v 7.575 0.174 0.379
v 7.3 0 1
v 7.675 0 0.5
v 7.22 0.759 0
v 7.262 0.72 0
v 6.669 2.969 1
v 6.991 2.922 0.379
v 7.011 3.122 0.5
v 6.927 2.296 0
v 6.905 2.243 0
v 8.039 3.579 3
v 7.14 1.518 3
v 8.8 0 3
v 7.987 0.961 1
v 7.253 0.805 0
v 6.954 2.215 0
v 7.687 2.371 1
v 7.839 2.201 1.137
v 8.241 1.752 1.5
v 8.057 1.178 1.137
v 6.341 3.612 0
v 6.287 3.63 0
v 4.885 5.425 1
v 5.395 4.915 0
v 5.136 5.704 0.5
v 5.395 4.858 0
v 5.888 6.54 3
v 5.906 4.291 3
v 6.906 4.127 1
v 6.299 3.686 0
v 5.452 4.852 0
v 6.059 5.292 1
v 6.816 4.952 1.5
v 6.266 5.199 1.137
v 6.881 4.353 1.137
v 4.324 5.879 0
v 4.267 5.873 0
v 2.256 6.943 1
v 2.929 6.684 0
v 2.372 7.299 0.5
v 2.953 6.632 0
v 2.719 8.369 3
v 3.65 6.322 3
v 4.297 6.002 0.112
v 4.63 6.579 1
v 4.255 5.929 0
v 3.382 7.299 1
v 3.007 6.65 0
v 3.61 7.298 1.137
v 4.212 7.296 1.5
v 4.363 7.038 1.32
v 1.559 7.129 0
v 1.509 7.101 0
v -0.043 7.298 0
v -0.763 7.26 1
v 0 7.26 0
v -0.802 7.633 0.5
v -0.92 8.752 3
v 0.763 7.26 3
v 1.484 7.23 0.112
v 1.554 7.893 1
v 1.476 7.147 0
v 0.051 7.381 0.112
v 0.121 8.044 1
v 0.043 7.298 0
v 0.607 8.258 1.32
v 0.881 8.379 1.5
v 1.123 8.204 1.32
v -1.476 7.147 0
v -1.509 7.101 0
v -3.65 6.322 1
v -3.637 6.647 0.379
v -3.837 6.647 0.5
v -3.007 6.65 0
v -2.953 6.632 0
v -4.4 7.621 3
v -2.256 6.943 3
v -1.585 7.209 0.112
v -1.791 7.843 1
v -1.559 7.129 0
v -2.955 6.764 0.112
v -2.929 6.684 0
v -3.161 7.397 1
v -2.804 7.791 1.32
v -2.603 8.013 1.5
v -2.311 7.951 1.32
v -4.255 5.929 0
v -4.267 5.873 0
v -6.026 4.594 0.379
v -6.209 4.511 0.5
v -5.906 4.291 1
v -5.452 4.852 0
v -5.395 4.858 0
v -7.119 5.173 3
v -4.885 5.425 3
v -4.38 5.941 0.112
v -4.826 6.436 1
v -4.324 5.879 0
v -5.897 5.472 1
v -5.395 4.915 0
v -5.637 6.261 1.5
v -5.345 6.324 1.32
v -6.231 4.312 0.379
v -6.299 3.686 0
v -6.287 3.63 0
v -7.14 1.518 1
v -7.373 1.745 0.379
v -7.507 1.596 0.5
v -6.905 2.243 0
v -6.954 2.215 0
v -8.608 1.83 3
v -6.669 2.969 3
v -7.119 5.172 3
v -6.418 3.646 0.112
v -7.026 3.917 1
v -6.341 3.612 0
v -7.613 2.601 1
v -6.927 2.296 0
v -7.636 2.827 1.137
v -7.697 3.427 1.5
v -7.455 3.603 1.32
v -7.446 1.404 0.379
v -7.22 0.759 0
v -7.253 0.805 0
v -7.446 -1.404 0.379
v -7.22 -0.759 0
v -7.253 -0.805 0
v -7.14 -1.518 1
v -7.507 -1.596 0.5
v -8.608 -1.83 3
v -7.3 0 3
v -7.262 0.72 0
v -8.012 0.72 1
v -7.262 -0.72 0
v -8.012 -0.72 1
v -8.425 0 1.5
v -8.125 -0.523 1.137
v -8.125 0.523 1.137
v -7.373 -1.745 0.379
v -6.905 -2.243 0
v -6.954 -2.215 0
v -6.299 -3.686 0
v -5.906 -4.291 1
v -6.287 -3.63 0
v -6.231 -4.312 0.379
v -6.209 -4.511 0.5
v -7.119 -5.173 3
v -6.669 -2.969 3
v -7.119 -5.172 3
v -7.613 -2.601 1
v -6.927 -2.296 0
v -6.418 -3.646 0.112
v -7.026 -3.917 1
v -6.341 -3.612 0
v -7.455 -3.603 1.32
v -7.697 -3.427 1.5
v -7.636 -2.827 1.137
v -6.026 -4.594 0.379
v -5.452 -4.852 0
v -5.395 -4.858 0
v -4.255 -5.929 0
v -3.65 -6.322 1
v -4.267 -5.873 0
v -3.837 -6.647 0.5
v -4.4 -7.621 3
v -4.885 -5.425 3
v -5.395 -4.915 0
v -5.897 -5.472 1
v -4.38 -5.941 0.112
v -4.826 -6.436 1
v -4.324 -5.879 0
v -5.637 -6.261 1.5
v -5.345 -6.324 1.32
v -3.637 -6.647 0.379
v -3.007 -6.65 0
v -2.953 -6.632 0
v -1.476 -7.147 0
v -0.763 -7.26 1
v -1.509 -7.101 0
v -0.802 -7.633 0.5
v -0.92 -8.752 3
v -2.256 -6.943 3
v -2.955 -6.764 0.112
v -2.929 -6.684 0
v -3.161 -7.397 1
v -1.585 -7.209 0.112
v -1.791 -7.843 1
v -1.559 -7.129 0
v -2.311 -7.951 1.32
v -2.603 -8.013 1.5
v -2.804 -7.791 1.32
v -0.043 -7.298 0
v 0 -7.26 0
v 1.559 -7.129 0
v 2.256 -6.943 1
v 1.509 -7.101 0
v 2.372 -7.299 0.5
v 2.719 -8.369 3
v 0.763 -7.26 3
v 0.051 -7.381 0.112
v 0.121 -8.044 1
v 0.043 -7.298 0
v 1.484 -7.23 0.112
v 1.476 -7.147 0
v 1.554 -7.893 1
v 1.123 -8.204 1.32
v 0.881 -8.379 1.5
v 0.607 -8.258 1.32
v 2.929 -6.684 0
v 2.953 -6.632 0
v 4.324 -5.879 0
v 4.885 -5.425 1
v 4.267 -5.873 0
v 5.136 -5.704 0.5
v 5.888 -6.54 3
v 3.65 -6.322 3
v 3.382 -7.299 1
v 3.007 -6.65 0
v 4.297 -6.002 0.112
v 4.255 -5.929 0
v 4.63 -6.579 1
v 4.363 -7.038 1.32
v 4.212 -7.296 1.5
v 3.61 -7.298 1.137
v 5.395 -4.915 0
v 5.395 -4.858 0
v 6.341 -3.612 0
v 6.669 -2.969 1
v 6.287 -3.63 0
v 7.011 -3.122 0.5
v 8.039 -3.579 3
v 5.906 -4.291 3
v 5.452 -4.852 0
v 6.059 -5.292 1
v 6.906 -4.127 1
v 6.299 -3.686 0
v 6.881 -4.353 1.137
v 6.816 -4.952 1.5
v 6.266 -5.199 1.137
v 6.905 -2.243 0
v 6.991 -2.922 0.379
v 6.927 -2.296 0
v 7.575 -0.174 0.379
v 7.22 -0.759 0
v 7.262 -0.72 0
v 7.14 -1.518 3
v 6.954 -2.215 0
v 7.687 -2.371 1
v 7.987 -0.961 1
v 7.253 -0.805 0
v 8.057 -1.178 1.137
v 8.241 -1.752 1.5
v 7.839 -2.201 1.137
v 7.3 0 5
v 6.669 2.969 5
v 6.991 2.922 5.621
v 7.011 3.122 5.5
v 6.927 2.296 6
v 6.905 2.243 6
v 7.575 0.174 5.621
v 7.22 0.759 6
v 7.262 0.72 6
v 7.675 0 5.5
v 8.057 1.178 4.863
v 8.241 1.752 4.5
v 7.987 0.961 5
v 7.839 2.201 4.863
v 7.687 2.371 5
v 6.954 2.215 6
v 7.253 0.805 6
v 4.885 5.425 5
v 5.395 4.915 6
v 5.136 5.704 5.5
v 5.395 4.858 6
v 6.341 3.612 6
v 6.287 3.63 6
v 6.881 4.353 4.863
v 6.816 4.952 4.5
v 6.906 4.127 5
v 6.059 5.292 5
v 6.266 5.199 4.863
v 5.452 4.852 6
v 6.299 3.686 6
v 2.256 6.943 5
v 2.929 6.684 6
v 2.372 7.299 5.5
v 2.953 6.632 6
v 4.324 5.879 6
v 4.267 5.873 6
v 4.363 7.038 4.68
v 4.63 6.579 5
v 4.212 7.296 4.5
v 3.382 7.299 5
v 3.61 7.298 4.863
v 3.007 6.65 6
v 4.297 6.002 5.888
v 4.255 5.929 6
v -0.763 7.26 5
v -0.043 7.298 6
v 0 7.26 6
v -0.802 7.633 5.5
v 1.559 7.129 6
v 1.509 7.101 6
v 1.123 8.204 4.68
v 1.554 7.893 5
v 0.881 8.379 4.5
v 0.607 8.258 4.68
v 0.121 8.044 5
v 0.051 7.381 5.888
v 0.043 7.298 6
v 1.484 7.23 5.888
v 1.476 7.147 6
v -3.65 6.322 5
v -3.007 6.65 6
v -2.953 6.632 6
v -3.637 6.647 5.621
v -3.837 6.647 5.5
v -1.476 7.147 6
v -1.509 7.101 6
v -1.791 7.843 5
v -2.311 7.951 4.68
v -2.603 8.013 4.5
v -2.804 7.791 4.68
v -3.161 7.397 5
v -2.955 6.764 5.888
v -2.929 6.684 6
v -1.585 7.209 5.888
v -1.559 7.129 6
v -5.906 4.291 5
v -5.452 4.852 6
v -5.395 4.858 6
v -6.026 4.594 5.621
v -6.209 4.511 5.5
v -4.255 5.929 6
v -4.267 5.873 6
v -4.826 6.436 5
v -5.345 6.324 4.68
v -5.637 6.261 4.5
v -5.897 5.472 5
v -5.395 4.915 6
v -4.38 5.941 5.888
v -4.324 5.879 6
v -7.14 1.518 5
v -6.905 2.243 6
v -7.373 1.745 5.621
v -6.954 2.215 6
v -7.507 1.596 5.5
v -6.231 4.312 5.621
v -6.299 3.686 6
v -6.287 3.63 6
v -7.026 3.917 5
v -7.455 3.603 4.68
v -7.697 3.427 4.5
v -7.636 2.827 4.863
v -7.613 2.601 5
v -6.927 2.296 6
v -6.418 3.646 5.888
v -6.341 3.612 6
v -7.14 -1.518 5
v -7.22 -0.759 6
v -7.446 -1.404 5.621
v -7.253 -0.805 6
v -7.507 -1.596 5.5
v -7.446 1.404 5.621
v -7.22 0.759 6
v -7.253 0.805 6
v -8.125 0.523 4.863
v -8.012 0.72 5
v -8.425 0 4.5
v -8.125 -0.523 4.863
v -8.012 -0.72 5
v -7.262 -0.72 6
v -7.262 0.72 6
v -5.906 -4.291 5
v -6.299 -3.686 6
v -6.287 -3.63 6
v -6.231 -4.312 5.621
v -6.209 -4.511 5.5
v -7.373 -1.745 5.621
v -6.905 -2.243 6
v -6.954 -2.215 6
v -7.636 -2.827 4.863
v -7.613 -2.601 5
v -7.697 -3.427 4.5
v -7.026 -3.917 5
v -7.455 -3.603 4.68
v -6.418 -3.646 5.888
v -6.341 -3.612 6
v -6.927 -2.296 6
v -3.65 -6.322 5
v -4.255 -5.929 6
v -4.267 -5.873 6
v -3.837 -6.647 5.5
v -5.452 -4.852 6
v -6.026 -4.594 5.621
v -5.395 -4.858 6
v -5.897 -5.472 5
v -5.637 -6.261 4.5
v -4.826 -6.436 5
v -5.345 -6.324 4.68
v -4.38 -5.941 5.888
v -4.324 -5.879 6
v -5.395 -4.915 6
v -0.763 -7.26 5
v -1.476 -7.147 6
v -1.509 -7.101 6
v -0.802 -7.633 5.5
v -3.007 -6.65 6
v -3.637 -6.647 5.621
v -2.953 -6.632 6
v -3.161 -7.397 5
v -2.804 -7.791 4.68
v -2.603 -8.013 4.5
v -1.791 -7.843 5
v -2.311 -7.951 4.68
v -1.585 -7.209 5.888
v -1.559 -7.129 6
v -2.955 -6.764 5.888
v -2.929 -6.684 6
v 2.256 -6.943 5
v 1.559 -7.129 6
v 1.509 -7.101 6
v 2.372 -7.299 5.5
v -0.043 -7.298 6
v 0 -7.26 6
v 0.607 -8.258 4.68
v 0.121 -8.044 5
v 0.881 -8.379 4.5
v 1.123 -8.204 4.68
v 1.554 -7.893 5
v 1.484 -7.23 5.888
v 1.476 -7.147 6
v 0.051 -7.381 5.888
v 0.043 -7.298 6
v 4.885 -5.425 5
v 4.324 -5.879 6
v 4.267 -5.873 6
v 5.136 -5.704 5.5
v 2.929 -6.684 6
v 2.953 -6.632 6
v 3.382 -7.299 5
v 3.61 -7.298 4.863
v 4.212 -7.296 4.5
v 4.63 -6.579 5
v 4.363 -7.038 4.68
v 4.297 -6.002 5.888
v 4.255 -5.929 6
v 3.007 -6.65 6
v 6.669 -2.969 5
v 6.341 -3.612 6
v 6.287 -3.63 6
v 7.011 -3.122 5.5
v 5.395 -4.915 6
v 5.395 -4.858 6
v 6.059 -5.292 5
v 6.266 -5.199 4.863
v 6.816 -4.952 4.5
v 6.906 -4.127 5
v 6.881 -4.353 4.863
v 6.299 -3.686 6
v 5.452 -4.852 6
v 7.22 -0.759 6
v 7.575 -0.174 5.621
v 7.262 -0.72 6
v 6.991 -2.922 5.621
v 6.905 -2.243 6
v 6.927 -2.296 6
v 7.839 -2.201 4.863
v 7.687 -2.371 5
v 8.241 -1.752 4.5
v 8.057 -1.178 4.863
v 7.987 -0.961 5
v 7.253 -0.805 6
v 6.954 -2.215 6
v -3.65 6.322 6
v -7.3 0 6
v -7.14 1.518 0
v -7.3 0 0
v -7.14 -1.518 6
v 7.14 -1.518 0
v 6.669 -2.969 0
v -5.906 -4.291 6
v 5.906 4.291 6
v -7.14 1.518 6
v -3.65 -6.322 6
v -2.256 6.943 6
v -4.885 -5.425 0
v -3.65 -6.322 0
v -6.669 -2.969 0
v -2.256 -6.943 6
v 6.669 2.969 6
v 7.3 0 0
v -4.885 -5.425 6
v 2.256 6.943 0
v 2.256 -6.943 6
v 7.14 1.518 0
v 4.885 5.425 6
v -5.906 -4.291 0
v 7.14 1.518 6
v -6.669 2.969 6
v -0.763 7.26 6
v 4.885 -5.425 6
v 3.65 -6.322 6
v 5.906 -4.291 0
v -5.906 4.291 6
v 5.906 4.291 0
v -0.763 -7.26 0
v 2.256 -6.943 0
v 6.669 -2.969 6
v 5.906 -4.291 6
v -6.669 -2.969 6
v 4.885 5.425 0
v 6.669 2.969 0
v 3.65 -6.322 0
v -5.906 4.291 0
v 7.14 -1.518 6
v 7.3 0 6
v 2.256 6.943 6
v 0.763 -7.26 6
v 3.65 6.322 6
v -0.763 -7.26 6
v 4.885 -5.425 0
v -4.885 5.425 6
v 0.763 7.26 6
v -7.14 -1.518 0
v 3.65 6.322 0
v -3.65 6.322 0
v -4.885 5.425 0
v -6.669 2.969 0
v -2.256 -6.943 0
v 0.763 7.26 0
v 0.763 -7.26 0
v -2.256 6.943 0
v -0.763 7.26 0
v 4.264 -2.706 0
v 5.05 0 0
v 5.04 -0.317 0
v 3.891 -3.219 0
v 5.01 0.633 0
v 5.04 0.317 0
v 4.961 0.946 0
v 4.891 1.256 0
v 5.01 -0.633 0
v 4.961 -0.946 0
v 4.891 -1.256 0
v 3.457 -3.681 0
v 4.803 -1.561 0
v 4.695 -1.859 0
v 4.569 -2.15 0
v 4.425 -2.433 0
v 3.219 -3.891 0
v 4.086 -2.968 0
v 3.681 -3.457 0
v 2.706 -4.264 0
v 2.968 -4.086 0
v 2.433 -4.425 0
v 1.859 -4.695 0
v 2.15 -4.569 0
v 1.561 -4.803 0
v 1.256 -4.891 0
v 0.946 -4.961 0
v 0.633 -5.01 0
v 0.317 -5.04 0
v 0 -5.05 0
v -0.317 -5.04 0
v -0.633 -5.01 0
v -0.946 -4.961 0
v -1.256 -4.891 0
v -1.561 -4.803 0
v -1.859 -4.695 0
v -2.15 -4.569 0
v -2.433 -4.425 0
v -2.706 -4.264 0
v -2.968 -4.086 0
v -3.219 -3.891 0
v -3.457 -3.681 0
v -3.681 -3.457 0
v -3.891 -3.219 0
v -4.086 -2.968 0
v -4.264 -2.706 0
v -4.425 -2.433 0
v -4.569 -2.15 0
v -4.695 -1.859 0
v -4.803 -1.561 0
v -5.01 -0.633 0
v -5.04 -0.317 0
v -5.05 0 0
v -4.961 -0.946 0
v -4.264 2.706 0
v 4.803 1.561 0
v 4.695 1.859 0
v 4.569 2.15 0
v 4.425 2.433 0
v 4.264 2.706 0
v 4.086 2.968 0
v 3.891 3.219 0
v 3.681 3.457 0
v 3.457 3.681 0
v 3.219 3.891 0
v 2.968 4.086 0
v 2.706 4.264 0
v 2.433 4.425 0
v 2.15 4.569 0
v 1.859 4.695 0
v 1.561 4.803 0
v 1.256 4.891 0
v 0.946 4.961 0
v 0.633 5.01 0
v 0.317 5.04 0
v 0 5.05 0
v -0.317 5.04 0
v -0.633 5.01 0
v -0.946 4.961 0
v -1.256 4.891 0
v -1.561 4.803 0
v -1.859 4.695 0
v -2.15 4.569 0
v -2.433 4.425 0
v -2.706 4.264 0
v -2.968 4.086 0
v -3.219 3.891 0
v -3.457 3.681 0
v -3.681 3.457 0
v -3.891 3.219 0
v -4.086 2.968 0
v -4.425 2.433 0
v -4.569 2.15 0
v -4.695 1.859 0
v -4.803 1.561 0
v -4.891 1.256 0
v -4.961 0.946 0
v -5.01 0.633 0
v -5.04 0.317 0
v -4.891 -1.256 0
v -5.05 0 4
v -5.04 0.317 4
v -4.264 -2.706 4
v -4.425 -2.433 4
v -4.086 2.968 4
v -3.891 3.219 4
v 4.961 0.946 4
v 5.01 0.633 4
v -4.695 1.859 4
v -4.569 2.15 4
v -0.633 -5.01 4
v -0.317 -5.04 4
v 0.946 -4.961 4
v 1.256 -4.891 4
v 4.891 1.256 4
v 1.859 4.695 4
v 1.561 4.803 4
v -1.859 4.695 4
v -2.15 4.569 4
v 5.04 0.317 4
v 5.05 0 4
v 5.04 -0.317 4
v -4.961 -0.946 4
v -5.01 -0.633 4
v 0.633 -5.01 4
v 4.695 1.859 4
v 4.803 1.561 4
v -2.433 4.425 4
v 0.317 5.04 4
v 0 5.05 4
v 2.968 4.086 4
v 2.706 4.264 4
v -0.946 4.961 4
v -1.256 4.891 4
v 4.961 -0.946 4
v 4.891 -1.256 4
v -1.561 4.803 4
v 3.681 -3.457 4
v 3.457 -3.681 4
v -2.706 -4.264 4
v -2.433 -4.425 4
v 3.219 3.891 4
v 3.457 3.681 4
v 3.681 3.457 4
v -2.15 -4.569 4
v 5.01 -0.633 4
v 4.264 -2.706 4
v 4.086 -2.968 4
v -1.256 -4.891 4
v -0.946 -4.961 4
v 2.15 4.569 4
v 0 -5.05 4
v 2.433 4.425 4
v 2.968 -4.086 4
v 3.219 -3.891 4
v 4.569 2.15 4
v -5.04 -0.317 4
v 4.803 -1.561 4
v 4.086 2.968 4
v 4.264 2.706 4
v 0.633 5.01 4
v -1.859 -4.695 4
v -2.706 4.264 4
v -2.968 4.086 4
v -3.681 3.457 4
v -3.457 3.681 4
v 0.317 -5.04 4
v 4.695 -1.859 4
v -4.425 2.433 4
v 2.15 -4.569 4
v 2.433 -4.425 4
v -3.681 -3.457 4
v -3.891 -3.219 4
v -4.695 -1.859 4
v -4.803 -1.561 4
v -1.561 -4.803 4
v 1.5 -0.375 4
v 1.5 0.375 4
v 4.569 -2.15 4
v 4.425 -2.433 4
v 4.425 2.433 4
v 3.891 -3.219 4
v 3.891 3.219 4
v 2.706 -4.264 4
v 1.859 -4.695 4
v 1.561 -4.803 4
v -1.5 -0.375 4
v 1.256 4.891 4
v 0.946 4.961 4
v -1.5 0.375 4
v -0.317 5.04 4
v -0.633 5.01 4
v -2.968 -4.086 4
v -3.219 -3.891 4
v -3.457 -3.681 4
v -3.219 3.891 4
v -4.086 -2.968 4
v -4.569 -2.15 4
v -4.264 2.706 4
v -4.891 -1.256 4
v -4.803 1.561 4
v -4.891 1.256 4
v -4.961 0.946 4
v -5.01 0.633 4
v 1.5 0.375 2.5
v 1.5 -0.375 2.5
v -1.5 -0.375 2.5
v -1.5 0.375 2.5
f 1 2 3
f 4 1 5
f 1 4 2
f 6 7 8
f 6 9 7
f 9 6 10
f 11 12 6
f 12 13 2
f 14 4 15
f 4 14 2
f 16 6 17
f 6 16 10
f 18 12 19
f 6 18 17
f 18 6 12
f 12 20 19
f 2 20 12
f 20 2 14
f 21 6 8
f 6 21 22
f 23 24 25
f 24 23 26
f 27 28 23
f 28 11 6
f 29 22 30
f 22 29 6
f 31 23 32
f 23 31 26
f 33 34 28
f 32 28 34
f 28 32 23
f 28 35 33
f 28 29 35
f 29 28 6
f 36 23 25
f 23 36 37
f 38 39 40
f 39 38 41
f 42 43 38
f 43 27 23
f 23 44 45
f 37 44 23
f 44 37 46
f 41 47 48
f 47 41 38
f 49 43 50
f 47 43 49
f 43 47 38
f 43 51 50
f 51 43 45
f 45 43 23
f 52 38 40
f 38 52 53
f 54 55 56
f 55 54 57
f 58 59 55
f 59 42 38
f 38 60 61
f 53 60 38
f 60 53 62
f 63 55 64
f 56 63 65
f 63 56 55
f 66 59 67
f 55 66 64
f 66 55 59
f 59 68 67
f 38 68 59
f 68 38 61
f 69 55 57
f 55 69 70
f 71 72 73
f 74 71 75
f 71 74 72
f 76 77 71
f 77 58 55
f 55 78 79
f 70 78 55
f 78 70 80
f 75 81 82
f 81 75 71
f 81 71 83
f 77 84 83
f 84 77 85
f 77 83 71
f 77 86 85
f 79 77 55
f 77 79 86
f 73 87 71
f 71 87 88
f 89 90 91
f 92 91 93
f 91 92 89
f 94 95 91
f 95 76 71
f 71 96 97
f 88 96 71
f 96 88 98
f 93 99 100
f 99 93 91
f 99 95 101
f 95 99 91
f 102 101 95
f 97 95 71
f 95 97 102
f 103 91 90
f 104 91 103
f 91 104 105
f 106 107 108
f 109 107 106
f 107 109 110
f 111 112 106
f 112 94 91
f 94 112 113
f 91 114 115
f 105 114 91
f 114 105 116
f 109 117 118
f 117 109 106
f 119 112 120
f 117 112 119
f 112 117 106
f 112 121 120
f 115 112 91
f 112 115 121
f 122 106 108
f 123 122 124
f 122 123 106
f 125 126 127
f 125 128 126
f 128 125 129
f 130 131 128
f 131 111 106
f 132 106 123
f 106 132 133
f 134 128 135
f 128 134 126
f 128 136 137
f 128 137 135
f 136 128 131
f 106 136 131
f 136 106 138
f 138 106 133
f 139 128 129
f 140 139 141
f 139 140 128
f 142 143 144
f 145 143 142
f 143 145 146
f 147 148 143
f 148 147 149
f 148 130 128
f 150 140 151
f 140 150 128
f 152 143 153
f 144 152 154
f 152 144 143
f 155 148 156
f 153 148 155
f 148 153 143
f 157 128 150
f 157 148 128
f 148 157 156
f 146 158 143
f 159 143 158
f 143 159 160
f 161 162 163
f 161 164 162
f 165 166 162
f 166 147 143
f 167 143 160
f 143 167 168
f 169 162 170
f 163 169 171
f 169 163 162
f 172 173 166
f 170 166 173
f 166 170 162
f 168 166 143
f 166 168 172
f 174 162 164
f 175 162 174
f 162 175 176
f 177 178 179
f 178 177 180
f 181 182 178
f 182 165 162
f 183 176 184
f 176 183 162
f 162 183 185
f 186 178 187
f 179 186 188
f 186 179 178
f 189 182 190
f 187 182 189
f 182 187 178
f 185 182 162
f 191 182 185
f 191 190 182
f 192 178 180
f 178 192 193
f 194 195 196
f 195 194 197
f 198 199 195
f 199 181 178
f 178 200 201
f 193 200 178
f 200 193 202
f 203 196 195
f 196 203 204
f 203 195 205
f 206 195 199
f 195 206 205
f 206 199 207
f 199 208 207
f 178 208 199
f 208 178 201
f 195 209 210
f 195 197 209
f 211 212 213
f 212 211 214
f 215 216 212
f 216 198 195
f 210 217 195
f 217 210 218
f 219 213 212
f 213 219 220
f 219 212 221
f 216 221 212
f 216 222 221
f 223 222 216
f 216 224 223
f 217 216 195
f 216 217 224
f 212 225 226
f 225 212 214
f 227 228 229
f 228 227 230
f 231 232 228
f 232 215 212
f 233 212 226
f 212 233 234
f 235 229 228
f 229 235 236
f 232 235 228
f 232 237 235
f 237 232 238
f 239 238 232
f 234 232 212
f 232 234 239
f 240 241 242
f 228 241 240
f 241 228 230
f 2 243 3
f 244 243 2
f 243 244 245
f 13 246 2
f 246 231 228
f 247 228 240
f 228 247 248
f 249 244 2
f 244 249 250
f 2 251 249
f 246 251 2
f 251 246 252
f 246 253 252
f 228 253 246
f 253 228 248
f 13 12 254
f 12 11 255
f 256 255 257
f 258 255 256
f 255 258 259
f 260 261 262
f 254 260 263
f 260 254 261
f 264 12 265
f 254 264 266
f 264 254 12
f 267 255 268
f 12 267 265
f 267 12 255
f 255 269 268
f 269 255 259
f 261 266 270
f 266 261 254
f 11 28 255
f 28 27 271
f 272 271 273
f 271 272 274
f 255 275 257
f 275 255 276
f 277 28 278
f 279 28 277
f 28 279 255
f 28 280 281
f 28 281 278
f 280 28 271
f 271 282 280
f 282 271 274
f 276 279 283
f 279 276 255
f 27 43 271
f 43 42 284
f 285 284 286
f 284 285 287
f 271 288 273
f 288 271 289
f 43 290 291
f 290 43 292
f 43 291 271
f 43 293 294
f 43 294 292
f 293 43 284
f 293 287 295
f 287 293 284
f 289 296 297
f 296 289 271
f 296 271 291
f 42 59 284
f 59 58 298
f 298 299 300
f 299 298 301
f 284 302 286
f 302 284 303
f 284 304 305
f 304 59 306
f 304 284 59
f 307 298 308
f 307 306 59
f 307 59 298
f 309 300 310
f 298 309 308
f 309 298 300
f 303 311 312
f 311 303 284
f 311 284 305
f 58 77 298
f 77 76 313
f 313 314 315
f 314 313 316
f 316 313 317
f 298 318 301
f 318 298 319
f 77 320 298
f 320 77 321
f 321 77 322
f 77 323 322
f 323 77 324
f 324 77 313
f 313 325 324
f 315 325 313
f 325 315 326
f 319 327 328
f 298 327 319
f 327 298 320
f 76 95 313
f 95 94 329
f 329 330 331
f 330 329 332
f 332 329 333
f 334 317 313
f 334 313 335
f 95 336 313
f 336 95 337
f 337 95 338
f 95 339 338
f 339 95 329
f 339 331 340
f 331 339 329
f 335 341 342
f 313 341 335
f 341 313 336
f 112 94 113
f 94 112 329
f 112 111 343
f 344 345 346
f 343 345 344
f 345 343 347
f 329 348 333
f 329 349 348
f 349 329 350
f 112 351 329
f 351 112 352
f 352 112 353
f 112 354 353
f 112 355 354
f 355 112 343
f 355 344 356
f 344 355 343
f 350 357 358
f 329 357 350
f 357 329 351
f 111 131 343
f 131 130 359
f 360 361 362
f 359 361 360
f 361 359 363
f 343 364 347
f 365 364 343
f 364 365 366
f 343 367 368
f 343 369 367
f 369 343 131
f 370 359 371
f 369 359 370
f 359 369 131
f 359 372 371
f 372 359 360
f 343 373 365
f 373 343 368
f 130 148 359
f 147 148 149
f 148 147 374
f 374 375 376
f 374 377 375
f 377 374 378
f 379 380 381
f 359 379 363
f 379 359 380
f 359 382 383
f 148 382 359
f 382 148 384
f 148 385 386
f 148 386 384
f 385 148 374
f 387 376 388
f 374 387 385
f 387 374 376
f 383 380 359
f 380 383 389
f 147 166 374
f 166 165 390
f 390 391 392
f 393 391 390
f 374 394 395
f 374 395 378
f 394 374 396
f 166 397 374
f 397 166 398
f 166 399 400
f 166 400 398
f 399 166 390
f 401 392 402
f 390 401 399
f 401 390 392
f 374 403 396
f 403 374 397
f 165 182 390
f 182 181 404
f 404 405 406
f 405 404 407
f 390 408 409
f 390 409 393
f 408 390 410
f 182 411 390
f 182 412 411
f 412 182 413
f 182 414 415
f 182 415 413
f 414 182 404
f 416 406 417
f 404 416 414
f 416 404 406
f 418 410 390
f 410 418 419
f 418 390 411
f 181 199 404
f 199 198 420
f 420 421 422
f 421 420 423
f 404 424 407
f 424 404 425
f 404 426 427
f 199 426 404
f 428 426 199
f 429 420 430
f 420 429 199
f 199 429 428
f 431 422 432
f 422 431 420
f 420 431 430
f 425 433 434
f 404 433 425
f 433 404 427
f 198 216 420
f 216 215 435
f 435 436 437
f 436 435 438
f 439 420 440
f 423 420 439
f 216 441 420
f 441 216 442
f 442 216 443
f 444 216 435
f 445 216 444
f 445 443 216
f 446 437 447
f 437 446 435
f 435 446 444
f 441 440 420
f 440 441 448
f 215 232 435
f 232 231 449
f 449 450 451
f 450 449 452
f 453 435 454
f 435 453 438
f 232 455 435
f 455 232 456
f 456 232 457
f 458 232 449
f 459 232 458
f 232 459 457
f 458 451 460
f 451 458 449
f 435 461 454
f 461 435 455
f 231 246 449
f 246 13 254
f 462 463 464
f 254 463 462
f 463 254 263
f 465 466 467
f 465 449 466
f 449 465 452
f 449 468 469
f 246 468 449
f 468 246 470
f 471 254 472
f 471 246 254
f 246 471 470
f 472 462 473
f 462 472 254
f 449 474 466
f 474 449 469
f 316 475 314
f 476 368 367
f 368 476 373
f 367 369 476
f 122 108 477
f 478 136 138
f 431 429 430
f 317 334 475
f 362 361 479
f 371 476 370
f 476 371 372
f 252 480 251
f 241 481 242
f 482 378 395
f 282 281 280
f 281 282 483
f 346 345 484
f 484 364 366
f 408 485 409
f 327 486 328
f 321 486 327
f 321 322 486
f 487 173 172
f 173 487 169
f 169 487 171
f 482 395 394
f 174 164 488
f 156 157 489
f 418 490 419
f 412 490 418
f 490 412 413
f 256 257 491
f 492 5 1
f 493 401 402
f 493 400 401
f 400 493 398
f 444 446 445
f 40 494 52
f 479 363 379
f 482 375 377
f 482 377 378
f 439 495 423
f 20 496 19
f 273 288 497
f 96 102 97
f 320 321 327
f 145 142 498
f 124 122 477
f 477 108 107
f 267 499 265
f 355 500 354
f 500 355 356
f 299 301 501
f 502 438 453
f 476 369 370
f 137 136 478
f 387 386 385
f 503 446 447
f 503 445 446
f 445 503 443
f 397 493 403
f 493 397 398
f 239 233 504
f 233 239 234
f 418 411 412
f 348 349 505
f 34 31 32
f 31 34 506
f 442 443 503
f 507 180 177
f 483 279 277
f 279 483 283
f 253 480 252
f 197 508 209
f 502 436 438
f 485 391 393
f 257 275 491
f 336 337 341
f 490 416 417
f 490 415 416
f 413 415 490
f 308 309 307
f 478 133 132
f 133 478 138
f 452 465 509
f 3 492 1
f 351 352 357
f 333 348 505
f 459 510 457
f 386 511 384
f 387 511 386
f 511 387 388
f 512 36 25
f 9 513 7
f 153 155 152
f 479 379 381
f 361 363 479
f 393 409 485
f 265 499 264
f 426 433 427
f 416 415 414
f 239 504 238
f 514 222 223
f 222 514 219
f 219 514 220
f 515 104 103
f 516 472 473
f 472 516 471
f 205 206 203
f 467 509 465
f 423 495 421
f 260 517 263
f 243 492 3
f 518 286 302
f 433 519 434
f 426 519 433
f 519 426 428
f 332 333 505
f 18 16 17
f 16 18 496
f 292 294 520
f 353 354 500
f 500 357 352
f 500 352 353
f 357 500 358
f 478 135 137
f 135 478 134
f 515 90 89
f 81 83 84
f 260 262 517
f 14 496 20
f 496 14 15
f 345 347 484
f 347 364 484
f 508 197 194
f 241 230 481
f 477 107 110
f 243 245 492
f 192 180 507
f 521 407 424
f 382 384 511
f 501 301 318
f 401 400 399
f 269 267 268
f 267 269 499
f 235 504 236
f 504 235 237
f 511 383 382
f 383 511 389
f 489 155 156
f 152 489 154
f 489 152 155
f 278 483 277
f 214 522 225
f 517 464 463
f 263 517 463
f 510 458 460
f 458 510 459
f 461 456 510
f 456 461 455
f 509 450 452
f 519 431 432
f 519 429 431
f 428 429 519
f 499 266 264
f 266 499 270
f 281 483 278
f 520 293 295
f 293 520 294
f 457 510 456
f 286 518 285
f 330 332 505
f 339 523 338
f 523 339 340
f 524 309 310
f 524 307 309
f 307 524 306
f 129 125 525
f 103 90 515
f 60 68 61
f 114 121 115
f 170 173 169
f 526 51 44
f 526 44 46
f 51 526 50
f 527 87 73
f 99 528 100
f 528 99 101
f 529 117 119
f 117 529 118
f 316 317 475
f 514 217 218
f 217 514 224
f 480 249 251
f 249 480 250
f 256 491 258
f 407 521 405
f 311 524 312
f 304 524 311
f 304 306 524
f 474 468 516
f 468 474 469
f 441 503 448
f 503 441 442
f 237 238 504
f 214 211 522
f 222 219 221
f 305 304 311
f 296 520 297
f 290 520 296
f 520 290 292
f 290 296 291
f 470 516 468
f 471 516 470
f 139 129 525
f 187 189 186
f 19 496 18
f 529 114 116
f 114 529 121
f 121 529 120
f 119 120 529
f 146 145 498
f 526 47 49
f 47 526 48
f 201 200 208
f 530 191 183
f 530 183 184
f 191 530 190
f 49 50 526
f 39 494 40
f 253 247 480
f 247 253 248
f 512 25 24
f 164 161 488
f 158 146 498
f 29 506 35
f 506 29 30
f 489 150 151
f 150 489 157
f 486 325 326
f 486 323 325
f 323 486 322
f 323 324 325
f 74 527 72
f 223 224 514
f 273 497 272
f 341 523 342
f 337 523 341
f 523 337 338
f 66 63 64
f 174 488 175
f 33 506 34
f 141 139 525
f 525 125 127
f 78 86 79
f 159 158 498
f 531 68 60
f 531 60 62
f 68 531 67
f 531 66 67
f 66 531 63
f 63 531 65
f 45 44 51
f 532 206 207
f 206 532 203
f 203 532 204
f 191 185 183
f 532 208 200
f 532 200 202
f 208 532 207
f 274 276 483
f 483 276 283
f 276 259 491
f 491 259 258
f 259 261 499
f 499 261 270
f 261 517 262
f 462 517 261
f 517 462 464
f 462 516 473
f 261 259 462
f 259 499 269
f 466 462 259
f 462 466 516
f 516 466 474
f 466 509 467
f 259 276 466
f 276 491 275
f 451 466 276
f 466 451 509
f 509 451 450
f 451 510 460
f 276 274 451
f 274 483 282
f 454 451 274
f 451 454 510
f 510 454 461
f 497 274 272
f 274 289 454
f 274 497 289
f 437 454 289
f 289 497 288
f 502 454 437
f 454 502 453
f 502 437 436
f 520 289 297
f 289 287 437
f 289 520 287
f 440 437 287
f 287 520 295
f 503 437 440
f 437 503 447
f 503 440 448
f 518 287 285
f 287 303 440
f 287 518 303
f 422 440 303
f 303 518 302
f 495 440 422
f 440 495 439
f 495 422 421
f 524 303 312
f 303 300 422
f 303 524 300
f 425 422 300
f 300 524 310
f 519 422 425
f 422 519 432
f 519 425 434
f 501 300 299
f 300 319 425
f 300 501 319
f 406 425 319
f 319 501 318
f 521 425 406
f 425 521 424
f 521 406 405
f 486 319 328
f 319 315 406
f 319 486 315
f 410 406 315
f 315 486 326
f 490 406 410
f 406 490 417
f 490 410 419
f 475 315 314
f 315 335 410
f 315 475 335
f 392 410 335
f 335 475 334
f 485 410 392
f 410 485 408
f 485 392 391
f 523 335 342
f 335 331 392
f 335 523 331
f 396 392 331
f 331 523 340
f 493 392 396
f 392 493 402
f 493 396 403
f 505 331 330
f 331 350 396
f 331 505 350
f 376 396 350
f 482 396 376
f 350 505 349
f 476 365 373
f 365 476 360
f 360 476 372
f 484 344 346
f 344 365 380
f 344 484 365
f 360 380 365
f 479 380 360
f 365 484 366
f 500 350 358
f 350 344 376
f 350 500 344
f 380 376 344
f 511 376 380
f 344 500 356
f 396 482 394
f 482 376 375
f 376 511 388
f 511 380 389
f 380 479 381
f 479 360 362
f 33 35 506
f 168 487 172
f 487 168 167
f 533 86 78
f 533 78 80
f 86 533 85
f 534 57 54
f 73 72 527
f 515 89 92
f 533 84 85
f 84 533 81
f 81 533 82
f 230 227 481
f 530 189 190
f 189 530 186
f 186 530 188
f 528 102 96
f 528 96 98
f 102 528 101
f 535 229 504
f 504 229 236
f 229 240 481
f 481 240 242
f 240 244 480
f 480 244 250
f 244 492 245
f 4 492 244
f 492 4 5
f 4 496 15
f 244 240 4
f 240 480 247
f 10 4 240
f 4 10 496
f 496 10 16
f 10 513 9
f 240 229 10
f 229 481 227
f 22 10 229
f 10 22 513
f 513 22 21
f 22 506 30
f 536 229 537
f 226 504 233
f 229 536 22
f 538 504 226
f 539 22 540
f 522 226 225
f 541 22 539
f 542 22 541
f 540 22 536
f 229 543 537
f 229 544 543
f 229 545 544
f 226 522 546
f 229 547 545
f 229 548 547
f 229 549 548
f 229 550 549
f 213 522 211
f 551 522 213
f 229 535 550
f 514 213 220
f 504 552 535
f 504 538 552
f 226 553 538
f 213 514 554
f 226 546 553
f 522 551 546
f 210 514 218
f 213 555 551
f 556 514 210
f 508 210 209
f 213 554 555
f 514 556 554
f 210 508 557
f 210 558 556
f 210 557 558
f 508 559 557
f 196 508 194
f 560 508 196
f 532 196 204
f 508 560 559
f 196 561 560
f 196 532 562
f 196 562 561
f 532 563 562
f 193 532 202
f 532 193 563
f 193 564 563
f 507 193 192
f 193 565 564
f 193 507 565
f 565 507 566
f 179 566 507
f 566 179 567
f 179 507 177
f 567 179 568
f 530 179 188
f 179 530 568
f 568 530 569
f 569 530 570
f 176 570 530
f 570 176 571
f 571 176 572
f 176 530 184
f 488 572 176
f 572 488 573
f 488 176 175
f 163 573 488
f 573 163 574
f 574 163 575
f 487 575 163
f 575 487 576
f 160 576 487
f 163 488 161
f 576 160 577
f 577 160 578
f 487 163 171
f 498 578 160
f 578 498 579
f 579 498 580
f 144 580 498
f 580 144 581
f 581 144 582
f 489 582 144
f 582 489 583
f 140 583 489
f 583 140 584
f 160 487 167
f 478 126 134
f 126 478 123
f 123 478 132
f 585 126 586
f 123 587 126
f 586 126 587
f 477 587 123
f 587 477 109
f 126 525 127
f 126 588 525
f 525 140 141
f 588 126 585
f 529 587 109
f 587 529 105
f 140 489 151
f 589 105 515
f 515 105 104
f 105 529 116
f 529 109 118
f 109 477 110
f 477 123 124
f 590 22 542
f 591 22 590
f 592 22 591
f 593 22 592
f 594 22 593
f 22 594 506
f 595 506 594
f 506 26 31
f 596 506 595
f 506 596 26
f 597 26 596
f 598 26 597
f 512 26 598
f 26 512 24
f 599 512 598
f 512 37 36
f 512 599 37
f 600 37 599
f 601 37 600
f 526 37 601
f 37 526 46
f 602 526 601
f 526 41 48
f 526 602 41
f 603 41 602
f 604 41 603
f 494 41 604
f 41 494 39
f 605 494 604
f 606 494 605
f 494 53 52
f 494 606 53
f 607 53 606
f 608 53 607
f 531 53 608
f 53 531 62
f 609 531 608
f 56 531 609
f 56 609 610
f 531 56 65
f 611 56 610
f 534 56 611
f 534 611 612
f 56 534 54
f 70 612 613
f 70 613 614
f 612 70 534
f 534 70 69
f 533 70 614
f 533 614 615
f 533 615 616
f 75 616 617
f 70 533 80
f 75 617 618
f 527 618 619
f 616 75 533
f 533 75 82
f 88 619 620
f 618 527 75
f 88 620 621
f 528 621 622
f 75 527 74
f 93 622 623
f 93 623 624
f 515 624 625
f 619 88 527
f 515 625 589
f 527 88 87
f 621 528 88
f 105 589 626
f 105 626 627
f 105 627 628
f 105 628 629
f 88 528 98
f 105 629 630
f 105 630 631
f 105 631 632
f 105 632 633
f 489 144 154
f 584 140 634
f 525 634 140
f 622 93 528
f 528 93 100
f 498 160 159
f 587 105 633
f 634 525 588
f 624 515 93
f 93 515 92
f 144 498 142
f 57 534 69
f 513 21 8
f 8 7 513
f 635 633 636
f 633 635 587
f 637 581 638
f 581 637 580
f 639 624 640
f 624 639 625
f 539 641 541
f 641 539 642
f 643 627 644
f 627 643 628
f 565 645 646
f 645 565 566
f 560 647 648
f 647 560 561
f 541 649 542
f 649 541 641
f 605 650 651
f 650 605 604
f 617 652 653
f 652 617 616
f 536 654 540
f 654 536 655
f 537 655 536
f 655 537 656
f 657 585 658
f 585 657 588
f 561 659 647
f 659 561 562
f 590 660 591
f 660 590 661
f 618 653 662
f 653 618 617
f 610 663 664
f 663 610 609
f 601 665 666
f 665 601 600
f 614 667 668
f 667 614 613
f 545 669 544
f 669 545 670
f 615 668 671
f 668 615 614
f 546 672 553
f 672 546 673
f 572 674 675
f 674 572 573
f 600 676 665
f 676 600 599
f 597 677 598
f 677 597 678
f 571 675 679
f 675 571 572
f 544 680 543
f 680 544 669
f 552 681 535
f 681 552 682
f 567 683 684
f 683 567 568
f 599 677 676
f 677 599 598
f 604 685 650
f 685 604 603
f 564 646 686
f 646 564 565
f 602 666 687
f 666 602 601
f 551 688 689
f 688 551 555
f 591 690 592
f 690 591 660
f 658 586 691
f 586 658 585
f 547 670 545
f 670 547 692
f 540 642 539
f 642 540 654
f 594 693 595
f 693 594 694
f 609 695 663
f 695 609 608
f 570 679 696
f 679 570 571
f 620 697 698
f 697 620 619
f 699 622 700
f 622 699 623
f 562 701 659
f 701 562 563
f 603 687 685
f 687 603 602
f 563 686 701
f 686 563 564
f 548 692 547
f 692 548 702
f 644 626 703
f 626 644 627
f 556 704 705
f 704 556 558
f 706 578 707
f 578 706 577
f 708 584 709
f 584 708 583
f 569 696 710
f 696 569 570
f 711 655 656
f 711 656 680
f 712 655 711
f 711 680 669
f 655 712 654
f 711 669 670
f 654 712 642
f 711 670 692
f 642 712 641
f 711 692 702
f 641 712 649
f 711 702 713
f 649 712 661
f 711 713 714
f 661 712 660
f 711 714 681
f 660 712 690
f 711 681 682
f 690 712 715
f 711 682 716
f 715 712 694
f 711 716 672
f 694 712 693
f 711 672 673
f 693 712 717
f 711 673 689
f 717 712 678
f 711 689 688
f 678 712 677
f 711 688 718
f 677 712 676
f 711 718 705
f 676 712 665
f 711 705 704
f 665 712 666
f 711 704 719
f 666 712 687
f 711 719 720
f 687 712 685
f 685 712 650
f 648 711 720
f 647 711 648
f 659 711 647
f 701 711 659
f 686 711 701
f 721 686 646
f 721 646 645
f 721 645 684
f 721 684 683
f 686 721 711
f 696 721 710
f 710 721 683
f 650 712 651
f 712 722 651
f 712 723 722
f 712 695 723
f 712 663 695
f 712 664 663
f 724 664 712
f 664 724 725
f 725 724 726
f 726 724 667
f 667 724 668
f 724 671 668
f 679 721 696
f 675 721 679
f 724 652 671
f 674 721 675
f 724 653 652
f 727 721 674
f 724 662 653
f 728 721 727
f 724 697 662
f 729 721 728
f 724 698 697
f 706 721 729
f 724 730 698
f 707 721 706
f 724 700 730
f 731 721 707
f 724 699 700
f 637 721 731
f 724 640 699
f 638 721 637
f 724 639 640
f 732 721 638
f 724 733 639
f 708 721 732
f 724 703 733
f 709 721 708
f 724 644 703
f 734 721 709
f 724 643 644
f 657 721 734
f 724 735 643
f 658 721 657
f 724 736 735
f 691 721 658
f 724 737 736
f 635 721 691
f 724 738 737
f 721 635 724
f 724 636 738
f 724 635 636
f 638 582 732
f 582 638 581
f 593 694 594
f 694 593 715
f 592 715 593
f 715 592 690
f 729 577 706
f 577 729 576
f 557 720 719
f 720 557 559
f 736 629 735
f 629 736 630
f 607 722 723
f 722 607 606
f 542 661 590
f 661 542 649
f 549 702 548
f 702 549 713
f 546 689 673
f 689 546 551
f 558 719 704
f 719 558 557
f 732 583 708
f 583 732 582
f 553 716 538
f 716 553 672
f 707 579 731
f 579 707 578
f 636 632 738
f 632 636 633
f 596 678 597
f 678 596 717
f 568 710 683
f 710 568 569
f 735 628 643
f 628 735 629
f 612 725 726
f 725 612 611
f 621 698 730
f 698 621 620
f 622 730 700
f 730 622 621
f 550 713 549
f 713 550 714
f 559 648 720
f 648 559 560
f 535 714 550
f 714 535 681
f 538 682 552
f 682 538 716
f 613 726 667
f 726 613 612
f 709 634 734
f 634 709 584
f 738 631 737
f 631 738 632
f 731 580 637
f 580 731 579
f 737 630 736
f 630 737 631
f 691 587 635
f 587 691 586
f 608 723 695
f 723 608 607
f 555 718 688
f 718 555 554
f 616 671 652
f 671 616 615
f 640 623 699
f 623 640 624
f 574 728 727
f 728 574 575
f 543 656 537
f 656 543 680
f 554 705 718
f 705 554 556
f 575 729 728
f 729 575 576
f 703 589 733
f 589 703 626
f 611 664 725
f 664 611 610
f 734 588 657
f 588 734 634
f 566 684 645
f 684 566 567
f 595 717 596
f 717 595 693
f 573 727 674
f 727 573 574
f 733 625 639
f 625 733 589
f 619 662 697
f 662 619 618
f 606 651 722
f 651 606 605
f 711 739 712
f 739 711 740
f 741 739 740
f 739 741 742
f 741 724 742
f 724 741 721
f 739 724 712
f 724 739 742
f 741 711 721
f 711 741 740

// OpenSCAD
/* [Screw Head] */

// Diameter of the machine screw's head in mm
screw_head_diameter = 10.1;

// Height of the machine screw's head in mm
screw_head_height = 4;

/* [Cap Thickness] */

// Horizontal thickness of the sides (measured from the edge of the screw head, radially outward in mm)
side_thickness = 3;

// Top thickness of the thumbscrew cap in mm
top_thickness = 2;

/* [Screw Drive] */

// Phillips head or flat head machine screw?
phillips_head = 0; //[0:flathead, 1:phillips]

//  Width of the drive in mm
tip_width = 0.75;

// Length of the drive in mm 
tip_length = 3;

// Depth of the drive in mm
tip_depth = 1.5;

/* [Hidden] */
$fn=100;

/*
 * knurledFinishLib_v2.scad
 * 
 * Written by aubenc @ Thingiverse
 *
 * This script is licensed under the Public Domain license.
 *
 * http://www.thingiverse.com/thing:31122
 *
 * Derived from knurledFinishLib.scad (also Public Domain license) available at
 *
 * http://www.thingiverse.com/thing:9095
 *
 * Usage:
 *
 *	 Drop this script somewhere where OpenSCAD can find it (your current project's
 *	 working directory/folder or your OpenSCAD libraries directory/folder).
 *
 *	 Add the line:
 *
 *		use <knurledFinishLib_v2.scad>
 *
 *	 in your OpenSCAD script and call either...
 *
 *    knurled_cyl( Knurled cylinder height,
 *                 Knurled cylinder outer diameter,
 *                 Knurl polyhedron width,
 *                 Knurl polyhedron height,
 *                 Knurl polyhedron depth,
 *                 Cylinder ends smoothed height,
 *                 Knurled surface smoothing amount );
 *
 *  ...or...
 *
 *    knurl();
 *
 *	If you use knurled_cyl() module, you need to specify the values for all and
 *
 *  Call the module ' help(); ' for a little bit more of detail
 *  and/or take a look to the PDF available at http://www.thingiverse.com/thing:9095
 *  for a in depth descrition of the knurl properties.
 */


module knurl(	k_cyl_hg	= 12,
					k_cyl_od	= 25,
					knurl_wd =  3,
					knurl_hg =  4,
					knurl_dp =  1.5,
					e_smooth =  2,
					s_smooth =  0)
{
    knurled_cyl(k_cyl_hg, k_cyl_od, 
                knurl_wd, knurl_hg, knurl_dp, 
                e_smooth, s_smooth);
}

module knurled_cyl(chg, cod, cwd, csh, cdp, fsh, smt)
{
    cord=(cod+cdp+cdp*smt/100)/2;
    cird=cord-cdp;
    cfn=round(2*cird*PI/cwd);
    clf=360/cfn;
    crn=ceil(chg/csh);

    echo("knurled cylinder max diameter: ", 2*cord);
    echo("knurled cylinder min diameter: ", 2*cird);

	 if( fsh < 0 )
    {
        union()
        {
            shape(fsh, cird+cdp*smt/100, cord, cfn*4, chg);

            translate([0,0,-(crn*csh-chg)/2])
              knurled_finish(cord, cird, clf, csh, cfn, crn);
        }
    }
    else if ( fsh == 0 )
    {
        intersection()
        {
            cylinder(h=chg, r=cord-cdp*smt/100, $fn=2*cfn, center=false);

            translate([0,0,-(crn*csh-chg)/2])
              knurled_finish(cord, cird, clf, csh, cfn, crn);
        }
    }
    else
    {
        intersection()
        {
            shape(fsh, cird, cord-cdp*smt/100, cfn*4, chg);

            translate([0,0,-(crn*csh-chg)/2])
              knurled_finish(cord, cird, clf, csh, cfn, crn);
        }
    }
}

module shape(hsh, ird, ord, fn4, hg)
{
	x0= 0;	x1 = hsh > 0 ? ird : ord;		x2 = hsh > 0 ? ord : ird;
	y0=-0.1;	y1=0;	y2=abs(hsh);	y3=hg-abs(hsh);	y4=hg;	y5=hg+0.1;

	if ( hsh >= 0 )
	{
		rotate_extrude(convexity=10, $fn=fn4)
		polygon(points=[	[x0,y1],[x1,y1],[x2,y2],[x2,y3],[x1,y4],[x0,y4]	],
					paths=[	[0,1,2,3,4,5]	]);
	}
	else
	{
		rotate_extrude(convexity=10, $fn=fn4)
		polygon(points=[	[x0,y0],[x1,y0],[x1,y1],[x2,y2],
								[x2,y3],[x1,y4],[x1,y5],[x0,y5]	],
					paths=[	[0,1,2,3,4,5,6,7]	]);
	}
}

module knurled_finish(ord, ird, lf, sh, fn, rn)
{
    for(j=[0:rn-1])
    assign(h0=sh*j, h1=sh*(j+1/2), h2=sh*(j+1))
    {
        for(i=[0:fn-1])
        assign(lf0=lf*i, lf1=lf*(i+1/2), lf2=lf*(i+1))
        {
            polyhedron(
                points=[
                     [ 0,0,h0],
                     [ ord*cos(lf0), ord*sin(lf0), h0],
                     [ ird*cos(lf1), ird*sin(lf1), h0],
                     [ ord*cos(lf2), ord*sin(lf2), h0],

                     [ ird*cos(lf0), ird*sin(lf0), h1],
                     [ ord*cos(lf1), ord*sin(lf1), h1],
                     [ ird*cos(lf2), ird*sin(lf2), h1],

                     [ 0,0,h2],
                     [ ord*cos(lf0), ord*sin(lf0), h2],
                     [ ird*cos(lf1), ird*sin(lf1), h2],
                     [ ord*cos(lf2), ord*sin(lf2), h2]
                    ],
                triangles=[
                     [0,1,2],[2,3,0],
                     [1,0,4],[4,0,7],[7,8,4],
                     [8,7,9],[10,9,7],
                     [10,7,6],[6,7,0],[3,6,0],
                     [2,1,4],[3,2,6],[10,6,9],[8,9,4],
                     [4,5,2],[2,5,6],[6,5,9],[9,5,4]
                    ],
                convexity=5);
         }
    }
}


union() {
    difference () {
        //cylinder(r = screw_head_radius + thickness, h = screw_head_height + thickness);
        knurl(k_cyl_hg	= screw_head_height + top_thickness, k_cyl_od = screw_head_diameter + (side_thickness * 2));
        cylinder(r = (screw_head_diameter / 2) ,h = screw_head_height);
    };
    difference() {
        translate([0,0,(screw_head_height-(tip_depth/2))]) {
            union() {
                cube([tip_length, tip_width, tip_depth], center=true);
                if (phillips_head) {
                    cube([tip_width, tip_length, tip_depth], center=true);
                }
            }
        }
        
    }
}
